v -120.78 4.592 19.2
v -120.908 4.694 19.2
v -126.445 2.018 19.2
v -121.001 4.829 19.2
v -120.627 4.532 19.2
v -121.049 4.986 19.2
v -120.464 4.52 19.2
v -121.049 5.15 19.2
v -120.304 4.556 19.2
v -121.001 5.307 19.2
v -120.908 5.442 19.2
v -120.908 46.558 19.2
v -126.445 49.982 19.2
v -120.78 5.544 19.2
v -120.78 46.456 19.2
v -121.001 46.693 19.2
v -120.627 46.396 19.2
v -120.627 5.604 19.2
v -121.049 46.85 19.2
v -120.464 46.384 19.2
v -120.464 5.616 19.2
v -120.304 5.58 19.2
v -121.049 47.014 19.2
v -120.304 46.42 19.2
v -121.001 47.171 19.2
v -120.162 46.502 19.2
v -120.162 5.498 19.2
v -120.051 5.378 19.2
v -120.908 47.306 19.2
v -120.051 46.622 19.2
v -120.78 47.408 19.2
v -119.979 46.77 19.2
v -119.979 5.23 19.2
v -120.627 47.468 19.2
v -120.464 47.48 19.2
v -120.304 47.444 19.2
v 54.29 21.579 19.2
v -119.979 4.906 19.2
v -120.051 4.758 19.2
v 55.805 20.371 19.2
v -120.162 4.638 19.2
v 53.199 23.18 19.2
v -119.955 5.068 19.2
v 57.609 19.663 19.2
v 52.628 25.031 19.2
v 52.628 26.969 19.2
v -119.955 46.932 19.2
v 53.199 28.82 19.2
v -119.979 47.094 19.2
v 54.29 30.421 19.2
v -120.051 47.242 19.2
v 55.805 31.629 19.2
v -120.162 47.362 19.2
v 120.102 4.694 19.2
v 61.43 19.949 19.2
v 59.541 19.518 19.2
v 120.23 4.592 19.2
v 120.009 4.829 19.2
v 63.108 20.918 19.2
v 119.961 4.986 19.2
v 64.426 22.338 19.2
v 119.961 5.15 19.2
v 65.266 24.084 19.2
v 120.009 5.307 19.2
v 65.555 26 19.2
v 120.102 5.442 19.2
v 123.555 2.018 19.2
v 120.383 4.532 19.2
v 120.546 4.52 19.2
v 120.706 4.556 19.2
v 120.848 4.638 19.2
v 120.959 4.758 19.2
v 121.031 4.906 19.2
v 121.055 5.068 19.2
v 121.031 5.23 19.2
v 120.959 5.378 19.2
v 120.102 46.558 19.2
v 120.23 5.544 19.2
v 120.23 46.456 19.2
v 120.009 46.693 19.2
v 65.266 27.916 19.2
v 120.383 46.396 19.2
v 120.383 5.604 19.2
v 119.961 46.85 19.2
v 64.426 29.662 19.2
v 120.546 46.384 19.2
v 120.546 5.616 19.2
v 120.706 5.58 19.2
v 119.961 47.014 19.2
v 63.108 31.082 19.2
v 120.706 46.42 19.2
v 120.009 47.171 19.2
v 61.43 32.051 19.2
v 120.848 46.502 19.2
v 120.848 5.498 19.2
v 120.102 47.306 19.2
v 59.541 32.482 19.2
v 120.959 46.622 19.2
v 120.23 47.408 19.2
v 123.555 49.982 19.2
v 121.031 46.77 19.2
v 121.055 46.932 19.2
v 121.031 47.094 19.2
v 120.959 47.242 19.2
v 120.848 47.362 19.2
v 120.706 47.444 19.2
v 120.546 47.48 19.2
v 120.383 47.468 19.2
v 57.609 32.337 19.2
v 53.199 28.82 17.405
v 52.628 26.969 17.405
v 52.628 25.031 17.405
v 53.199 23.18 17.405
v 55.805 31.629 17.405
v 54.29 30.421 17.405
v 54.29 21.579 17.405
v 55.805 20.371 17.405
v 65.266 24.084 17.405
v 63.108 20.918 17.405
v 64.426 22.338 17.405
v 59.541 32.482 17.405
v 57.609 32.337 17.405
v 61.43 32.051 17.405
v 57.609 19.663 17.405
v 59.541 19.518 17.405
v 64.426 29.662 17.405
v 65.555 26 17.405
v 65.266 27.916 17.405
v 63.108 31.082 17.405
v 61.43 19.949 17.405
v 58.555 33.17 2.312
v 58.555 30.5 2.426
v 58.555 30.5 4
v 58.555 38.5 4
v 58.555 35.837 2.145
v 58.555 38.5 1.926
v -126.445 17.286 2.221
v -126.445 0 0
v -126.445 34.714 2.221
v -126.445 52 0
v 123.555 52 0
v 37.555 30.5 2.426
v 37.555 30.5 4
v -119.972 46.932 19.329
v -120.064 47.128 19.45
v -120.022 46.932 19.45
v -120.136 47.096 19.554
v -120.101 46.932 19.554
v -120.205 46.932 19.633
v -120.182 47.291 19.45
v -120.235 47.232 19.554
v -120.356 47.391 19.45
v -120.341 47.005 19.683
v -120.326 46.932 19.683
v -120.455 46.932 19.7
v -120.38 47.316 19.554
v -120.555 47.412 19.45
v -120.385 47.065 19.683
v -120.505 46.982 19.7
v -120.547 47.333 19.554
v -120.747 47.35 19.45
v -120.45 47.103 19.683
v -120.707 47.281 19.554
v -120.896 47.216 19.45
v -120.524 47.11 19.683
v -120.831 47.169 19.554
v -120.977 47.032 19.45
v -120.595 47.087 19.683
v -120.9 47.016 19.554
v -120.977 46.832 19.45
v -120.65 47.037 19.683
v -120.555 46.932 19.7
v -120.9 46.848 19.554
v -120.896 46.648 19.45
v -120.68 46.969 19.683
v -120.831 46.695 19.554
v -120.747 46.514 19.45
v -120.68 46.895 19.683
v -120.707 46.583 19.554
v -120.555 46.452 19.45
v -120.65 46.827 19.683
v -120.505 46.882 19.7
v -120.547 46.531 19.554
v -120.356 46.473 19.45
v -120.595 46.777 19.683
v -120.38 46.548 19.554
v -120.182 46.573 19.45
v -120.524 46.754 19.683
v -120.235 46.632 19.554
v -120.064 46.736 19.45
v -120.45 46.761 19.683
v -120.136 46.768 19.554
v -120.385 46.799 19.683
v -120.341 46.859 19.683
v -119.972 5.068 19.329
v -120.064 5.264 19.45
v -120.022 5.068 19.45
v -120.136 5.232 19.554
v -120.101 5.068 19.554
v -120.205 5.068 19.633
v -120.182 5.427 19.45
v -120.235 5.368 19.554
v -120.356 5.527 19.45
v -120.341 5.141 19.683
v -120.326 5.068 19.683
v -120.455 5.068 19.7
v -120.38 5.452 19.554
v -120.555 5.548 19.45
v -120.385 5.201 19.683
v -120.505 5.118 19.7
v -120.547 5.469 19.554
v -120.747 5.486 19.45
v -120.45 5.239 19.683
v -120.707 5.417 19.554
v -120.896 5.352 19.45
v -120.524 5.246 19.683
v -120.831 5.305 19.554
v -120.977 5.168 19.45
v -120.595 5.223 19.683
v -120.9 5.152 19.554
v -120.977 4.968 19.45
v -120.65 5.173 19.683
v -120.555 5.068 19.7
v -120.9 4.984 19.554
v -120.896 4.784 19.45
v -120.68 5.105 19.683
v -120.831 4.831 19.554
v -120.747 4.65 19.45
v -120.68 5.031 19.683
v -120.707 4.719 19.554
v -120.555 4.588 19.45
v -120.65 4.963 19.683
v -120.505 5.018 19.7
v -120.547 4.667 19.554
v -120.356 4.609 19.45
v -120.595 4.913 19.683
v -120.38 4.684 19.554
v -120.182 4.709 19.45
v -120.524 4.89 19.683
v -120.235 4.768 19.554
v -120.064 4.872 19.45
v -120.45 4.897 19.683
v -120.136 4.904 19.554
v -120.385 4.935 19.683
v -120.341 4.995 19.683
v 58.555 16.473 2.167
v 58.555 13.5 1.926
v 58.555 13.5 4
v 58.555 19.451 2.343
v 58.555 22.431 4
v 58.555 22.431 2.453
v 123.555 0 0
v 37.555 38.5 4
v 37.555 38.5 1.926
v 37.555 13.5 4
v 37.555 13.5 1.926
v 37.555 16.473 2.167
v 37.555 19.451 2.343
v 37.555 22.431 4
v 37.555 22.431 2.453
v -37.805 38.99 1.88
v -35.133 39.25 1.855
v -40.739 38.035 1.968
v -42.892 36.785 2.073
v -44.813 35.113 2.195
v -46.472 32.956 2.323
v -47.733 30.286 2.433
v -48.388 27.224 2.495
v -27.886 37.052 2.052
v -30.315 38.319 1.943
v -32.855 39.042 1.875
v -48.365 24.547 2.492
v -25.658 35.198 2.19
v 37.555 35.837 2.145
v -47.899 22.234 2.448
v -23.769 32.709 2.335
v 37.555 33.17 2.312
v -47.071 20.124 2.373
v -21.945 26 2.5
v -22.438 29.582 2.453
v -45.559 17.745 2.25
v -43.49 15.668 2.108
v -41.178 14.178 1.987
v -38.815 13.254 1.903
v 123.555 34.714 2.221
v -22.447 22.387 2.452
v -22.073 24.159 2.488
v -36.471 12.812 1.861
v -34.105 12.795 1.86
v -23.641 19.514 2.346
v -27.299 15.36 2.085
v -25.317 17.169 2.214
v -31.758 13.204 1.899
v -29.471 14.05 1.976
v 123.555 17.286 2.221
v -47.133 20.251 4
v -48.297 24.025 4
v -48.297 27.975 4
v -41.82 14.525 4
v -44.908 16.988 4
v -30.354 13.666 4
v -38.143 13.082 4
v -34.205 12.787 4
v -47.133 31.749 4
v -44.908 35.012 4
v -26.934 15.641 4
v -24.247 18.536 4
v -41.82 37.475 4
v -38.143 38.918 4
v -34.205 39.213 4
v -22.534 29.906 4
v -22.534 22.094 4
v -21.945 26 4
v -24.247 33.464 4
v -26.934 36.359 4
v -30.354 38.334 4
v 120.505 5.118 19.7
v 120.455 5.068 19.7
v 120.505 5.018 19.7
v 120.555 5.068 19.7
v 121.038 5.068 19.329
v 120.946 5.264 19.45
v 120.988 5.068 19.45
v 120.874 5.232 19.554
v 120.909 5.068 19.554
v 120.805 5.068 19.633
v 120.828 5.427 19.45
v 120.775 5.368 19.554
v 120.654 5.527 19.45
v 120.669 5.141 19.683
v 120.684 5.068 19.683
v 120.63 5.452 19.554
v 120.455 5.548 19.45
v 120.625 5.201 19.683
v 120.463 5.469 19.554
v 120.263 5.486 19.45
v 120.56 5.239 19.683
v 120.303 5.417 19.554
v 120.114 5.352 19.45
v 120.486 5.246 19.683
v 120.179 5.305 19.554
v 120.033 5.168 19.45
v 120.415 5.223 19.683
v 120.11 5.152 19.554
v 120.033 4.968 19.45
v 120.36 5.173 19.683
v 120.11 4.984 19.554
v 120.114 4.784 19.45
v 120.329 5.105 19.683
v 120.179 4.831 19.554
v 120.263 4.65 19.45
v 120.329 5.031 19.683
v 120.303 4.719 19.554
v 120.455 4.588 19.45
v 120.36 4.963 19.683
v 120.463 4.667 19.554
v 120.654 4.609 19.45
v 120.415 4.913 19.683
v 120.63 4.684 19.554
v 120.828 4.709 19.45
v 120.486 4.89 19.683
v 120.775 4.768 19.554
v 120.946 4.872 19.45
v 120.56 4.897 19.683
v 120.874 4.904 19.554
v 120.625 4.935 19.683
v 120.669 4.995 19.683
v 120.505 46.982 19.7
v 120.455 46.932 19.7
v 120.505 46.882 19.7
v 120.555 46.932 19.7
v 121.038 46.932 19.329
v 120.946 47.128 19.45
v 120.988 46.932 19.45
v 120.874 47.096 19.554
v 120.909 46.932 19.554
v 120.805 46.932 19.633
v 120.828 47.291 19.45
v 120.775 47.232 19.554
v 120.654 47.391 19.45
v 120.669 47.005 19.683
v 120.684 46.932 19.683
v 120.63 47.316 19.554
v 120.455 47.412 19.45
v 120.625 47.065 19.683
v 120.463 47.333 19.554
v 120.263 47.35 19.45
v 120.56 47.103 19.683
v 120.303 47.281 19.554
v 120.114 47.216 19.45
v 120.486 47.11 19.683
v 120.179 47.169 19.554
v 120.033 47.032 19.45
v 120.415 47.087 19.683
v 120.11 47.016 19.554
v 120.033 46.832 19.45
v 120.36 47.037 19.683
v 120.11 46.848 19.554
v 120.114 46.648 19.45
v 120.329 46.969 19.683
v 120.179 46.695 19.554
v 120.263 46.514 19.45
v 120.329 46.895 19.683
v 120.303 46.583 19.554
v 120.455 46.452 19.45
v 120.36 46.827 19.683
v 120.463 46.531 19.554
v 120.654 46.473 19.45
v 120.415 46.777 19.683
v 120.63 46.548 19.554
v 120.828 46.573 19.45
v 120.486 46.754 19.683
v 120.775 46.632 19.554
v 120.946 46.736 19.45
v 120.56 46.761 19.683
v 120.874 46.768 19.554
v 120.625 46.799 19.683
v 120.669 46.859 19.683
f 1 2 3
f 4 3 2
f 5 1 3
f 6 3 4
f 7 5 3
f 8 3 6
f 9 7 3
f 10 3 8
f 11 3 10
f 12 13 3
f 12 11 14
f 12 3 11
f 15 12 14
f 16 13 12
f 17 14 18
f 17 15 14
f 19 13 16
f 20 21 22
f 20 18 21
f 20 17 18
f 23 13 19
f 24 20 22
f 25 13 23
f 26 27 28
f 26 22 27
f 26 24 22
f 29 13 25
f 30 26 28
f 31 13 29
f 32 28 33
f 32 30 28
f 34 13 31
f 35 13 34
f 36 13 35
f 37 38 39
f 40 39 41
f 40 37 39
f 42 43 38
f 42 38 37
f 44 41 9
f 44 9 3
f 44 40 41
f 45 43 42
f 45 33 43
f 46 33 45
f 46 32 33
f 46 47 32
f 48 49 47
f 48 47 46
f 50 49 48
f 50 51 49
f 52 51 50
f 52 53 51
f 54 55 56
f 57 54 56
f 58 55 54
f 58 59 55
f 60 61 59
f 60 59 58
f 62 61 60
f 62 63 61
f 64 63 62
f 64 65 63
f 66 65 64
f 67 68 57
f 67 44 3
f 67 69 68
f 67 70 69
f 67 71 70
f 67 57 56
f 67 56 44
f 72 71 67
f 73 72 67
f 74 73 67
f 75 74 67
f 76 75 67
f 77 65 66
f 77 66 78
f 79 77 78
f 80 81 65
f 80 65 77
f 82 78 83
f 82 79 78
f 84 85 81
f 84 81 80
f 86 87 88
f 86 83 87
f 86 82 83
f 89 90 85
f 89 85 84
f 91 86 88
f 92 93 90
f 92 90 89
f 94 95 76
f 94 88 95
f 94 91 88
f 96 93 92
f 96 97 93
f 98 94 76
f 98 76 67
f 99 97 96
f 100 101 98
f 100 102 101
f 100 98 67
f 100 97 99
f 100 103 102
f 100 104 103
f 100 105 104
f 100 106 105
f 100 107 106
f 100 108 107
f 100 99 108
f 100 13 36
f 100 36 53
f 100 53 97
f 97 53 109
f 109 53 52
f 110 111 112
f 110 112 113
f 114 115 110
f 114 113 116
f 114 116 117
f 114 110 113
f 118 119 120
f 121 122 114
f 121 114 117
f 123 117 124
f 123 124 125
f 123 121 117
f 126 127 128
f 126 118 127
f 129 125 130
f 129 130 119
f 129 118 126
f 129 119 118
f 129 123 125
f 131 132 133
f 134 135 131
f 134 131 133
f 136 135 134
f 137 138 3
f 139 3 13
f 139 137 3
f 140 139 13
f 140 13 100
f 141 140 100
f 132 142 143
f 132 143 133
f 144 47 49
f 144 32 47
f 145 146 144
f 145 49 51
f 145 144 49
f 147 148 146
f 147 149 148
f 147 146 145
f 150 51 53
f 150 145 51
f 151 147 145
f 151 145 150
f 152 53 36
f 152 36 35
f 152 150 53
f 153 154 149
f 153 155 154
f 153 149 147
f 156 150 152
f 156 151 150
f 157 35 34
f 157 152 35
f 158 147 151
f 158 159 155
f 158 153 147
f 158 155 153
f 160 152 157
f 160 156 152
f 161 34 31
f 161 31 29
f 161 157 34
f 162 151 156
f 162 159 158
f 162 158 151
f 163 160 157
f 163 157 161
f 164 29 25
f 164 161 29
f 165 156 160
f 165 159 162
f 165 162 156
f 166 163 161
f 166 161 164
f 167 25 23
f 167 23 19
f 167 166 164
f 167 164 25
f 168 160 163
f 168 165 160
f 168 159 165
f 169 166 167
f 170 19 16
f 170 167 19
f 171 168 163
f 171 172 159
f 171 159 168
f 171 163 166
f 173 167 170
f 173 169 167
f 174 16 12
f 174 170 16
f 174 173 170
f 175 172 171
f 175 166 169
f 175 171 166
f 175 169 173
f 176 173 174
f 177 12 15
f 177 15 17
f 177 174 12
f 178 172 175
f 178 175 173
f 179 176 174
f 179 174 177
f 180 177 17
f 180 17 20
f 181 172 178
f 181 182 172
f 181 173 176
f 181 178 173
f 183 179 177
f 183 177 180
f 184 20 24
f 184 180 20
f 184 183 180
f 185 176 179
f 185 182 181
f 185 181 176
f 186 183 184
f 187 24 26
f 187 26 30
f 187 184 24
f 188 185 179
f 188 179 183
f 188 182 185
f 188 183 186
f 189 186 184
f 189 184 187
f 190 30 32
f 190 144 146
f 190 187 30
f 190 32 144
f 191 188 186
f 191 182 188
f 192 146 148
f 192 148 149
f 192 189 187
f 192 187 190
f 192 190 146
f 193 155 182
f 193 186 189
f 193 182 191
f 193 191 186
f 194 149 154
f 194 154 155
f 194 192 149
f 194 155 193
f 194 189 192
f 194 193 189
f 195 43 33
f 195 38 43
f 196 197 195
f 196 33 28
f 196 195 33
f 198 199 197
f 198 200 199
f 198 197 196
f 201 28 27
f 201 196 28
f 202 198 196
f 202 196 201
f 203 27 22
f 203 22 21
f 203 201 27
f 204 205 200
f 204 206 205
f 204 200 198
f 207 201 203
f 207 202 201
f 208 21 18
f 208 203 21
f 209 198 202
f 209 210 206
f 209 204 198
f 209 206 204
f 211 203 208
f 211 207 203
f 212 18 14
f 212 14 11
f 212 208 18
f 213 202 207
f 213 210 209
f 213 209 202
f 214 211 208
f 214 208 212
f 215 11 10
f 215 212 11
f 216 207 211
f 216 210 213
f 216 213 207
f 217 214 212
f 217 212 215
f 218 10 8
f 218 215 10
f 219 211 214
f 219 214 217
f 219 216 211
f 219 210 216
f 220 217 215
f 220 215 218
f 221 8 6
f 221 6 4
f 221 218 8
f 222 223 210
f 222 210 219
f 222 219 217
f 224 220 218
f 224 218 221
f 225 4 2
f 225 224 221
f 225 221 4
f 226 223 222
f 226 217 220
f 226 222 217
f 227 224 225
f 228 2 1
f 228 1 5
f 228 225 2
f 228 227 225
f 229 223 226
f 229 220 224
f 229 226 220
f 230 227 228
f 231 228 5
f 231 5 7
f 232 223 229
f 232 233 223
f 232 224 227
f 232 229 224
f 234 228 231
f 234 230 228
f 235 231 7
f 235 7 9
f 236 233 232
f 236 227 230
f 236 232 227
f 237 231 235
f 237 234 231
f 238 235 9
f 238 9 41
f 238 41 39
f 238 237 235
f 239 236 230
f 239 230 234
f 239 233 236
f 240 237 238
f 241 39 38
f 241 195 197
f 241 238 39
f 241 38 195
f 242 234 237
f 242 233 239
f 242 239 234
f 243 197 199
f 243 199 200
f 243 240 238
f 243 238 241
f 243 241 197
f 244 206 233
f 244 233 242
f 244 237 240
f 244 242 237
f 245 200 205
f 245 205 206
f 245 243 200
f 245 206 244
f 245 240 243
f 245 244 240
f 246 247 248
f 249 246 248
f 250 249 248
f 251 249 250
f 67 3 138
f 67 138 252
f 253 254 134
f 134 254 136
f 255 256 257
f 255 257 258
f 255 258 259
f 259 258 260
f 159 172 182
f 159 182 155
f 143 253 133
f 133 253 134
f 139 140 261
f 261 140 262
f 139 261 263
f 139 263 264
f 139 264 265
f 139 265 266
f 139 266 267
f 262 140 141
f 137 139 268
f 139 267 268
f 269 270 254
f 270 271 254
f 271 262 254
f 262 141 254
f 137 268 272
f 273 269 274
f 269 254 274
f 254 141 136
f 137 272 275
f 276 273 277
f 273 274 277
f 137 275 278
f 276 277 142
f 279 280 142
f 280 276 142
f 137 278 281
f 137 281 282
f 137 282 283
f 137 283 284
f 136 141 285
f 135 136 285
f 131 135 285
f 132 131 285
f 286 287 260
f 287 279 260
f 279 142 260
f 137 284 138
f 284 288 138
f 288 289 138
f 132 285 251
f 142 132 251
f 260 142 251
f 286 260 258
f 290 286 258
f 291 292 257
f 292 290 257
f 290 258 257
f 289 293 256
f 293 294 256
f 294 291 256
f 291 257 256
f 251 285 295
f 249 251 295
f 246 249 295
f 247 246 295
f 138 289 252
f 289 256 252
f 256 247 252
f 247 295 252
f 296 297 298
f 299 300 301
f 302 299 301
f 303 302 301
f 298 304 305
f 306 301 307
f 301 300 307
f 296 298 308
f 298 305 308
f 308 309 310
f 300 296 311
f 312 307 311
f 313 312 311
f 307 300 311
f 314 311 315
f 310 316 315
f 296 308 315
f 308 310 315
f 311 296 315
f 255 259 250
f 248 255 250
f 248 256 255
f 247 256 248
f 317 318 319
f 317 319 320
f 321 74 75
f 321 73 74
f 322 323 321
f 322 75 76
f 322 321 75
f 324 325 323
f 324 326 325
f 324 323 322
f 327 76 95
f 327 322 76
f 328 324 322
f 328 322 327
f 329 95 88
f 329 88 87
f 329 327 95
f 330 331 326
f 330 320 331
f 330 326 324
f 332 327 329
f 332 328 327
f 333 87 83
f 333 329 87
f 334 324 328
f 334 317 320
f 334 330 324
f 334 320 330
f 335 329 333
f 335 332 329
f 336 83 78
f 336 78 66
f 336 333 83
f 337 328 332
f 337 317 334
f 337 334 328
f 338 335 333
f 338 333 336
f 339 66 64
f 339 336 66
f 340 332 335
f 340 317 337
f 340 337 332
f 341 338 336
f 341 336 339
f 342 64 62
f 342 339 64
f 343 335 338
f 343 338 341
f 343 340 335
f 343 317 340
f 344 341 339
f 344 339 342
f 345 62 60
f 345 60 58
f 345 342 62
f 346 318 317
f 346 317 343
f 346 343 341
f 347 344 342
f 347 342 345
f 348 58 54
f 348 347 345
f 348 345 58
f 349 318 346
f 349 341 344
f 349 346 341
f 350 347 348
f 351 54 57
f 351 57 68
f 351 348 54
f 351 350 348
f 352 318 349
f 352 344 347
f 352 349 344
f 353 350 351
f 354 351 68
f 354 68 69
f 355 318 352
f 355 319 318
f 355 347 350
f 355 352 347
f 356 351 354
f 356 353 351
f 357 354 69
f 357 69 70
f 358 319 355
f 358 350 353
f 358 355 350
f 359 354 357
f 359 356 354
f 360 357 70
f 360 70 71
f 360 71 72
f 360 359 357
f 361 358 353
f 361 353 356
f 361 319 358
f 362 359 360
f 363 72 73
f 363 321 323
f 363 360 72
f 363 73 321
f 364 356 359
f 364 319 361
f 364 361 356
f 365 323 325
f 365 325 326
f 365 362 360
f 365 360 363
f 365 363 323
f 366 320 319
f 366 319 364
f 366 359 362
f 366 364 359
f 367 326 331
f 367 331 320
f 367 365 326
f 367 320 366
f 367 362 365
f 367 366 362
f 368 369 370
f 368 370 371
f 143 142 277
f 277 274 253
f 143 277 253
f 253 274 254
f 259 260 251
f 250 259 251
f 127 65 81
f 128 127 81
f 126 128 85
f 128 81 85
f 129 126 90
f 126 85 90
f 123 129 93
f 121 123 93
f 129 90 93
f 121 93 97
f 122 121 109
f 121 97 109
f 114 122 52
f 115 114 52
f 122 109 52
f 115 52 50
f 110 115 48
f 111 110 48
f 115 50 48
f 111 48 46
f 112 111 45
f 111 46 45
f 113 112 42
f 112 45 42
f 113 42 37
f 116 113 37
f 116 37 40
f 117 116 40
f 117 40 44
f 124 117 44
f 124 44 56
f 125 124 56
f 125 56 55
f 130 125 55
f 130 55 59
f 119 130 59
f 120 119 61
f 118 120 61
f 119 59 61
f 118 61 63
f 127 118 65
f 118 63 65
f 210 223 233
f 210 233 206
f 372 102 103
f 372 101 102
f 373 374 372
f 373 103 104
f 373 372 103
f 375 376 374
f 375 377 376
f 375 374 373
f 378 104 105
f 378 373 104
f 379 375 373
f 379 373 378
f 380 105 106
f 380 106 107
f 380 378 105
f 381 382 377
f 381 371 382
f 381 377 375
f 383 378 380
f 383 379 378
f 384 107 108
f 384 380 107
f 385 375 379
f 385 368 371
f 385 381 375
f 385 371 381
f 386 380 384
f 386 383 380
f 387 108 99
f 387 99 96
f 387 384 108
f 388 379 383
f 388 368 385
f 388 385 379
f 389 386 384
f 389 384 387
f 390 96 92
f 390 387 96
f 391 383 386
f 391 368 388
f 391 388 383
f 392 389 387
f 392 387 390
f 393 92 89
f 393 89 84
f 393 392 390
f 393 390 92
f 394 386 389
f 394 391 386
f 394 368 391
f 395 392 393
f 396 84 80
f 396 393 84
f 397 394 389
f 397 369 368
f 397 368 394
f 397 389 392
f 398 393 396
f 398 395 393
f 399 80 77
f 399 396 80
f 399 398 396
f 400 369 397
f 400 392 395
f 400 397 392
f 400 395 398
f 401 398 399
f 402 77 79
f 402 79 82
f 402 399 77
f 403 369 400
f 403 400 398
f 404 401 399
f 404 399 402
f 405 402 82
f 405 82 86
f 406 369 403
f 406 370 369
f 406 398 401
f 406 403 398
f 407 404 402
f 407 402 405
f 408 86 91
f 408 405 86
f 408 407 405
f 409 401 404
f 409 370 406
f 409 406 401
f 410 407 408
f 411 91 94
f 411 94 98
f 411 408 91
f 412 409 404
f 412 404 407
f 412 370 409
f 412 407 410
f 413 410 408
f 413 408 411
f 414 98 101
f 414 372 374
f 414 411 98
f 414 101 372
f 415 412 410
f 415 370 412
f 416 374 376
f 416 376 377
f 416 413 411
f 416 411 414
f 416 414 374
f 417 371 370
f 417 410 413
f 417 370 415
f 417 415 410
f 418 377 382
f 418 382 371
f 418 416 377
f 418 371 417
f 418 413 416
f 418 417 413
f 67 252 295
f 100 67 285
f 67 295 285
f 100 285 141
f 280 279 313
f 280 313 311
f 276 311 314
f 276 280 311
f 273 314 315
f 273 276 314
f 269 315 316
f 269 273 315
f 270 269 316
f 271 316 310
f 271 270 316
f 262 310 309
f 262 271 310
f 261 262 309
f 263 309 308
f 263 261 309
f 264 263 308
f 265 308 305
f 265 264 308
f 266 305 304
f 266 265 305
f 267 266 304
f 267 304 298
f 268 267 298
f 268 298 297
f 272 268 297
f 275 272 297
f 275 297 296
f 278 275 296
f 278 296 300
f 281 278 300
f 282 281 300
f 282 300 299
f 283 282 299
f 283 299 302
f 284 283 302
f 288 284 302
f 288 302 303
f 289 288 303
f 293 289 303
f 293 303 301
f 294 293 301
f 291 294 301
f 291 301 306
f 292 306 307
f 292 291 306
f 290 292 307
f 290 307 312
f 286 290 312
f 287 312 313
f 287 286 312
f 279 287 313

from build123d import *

# Parameters (mm, degrees)
F0_W          = 250
F0_H          = 52
F1_DEPTH      = 19.2
F2_SIZE2      = 2.017991
F2_SIZE       = 19.19999
F3_SIZE2      = 2.017991
F3_SIZE       = 19.19999
F4_R          = 6.5
F5_DEPTH      = 1.7951503396
F7_DEPTH      = 58.4841370583
F7_DEPTH_BACK = 301.5629071742
F8_R          = 0.55
F9_DEPTH      = 0.5
F10_R         = 0.49999
F11_R         = 0.49999
F12_R         = 13.25
F13_DEPTH     = 4
F14_W         = 21
F14_H         = 8
F14_H_2       = 8.9314985695
F15_DEPTH     = 4


# Not quite as in the source:
# - a fillet or chamfer is up to 0.001 mm smaller than in the source, because OpenCascade refuses the exact size


with BuildPart() as f1:
    # F0 (on Top) → F1 (new body)
    with BuildSketch(Plane.XY):
        with Locations((-1.4450065748, 26)):
            Rectangle(F0_W, F0_H)
    extrude(amount=F1_DEPTH)

    # F2 (size 19.2 and 2.0180013171 in the source; OpenCascade refuses exactly that, so slightly less here)
    f2_edges = [f1.edges().sort_by_distance(p)[0] for p in [
        (-1.445007, 52, 19.2),
    ]]
    f2_side = f1.faces().sort_by_distance((-1.445007, 52, 9.6))[0]
    chamfer(f2_edges, length=F2_SIZE, length2=F2_SIZE2, reference=f2_side)

    # F3 (size 19.2 and 2.0180013171 in the source; OpenCascade refuses exactly that, so slightly less here)
    f3_edges = [f1.edges().sort_by_distance(p)[0] for p in [
        (-1.445007, 0, 19.2),
    ]]
    f3_side = f1.faces().sort_by_distance((-1.445007, 0, 9.6))[0]
    chamfer(f3_edges, length=F3_SIZE, length2=F3_SIZE2, reference=f3_side)

    # F4 (on face) → F5 (cut)
    with BuildSketch(Plane.XY.offset(19.2)):
        with Locations((59.0549934252, 25.9999986829)):
            Circle(F4_R)
    extrude(amount=-F5_DEPTH, mode=Mode.SUBTRACT)

    # F6 (on face) → F7 (cut, two sides)
    with BuildSketch(Plane.YZ.offset(123.5549934252)) as f7_sk:
        Polygon((56.2664195895, -9.8316892982), (52, 0), (0, 0), (-4.1076340713, -9.8316892982), align=None)
        with BuildLine():
            Line((0, 0), (52, 0))
            ThreePointArc((52, 0), (26, 2.5), (0, 0))
        make_face()
    extrude(amount=F7_DEPTH, mode=Mode.SUBTRACT)
    extrude(f7_sk.sketch, amount=-F7_DEPTH_BACK, mode=Mode.SUBTRACT)

    # F8 (on face) → F9 (join)
    with BuildSketch(Plane.XY.offset(19.2)):
        with Locations((120.5049934252, 5.0680013171)):
            Circle(F8_R)
        with Locations((120.5049934252, 46.9319986829)):
            Circle(F8_R)
        with Locations((-120.5049934252, 5.0680013171)):
            Circle(F8_R)
        with Locations((-120.5049934252, 46.9319986829)):
            Circle(F8_R)
    extrude(amount=F9_DEPTH)

    # F10 (radius 0.5 in the source; OpenCascade refuses exactly that, so slightly less here)
    f10_edges = [f1.edges().sort_by_distance(p)[0] for p in [
        (119.954993, 5.068001, 19.7),
    ]]
    fillet(f10_edges, radius=F10_R)

    # F11 (radius 0.5 in the source; OpenCascade refuses exactly that, so slightly less here)
    f11_edges = [f1.edges().sort_by_distance(p)[0] for p in [
        (-121.054993, 5.068001, 19.7),
        (119.954993, 46.931999, 19.7),
        (-121.054993, 46.931999, 19.7),
    ]]
    fillet(f11_edges, radius=F11_R)

    # F12 (on Top) → F13 (cut)
    with BuildSketch(Plane.XY):
        with Locations((-35.1950065748, 26)):
            Circle(F12_R)
    extrude(amount=F13_DEPTH, mode=Mode.SUBTRACT)

    # F14 (on Top) → F15 (cut)
    with BuildSketch(Plane.XY):
        with Locations((48.0549934252, 34.5)):
            Rectangle(F14_W, F14_H)
        with Locations((48.0549934252, 17.9657492848)):
            Rectangle(F14_W, F14_H_2)
    extrude(amount=F15_DEPTH, mode=Mode.SUBTRACT)


solid = f1.part
